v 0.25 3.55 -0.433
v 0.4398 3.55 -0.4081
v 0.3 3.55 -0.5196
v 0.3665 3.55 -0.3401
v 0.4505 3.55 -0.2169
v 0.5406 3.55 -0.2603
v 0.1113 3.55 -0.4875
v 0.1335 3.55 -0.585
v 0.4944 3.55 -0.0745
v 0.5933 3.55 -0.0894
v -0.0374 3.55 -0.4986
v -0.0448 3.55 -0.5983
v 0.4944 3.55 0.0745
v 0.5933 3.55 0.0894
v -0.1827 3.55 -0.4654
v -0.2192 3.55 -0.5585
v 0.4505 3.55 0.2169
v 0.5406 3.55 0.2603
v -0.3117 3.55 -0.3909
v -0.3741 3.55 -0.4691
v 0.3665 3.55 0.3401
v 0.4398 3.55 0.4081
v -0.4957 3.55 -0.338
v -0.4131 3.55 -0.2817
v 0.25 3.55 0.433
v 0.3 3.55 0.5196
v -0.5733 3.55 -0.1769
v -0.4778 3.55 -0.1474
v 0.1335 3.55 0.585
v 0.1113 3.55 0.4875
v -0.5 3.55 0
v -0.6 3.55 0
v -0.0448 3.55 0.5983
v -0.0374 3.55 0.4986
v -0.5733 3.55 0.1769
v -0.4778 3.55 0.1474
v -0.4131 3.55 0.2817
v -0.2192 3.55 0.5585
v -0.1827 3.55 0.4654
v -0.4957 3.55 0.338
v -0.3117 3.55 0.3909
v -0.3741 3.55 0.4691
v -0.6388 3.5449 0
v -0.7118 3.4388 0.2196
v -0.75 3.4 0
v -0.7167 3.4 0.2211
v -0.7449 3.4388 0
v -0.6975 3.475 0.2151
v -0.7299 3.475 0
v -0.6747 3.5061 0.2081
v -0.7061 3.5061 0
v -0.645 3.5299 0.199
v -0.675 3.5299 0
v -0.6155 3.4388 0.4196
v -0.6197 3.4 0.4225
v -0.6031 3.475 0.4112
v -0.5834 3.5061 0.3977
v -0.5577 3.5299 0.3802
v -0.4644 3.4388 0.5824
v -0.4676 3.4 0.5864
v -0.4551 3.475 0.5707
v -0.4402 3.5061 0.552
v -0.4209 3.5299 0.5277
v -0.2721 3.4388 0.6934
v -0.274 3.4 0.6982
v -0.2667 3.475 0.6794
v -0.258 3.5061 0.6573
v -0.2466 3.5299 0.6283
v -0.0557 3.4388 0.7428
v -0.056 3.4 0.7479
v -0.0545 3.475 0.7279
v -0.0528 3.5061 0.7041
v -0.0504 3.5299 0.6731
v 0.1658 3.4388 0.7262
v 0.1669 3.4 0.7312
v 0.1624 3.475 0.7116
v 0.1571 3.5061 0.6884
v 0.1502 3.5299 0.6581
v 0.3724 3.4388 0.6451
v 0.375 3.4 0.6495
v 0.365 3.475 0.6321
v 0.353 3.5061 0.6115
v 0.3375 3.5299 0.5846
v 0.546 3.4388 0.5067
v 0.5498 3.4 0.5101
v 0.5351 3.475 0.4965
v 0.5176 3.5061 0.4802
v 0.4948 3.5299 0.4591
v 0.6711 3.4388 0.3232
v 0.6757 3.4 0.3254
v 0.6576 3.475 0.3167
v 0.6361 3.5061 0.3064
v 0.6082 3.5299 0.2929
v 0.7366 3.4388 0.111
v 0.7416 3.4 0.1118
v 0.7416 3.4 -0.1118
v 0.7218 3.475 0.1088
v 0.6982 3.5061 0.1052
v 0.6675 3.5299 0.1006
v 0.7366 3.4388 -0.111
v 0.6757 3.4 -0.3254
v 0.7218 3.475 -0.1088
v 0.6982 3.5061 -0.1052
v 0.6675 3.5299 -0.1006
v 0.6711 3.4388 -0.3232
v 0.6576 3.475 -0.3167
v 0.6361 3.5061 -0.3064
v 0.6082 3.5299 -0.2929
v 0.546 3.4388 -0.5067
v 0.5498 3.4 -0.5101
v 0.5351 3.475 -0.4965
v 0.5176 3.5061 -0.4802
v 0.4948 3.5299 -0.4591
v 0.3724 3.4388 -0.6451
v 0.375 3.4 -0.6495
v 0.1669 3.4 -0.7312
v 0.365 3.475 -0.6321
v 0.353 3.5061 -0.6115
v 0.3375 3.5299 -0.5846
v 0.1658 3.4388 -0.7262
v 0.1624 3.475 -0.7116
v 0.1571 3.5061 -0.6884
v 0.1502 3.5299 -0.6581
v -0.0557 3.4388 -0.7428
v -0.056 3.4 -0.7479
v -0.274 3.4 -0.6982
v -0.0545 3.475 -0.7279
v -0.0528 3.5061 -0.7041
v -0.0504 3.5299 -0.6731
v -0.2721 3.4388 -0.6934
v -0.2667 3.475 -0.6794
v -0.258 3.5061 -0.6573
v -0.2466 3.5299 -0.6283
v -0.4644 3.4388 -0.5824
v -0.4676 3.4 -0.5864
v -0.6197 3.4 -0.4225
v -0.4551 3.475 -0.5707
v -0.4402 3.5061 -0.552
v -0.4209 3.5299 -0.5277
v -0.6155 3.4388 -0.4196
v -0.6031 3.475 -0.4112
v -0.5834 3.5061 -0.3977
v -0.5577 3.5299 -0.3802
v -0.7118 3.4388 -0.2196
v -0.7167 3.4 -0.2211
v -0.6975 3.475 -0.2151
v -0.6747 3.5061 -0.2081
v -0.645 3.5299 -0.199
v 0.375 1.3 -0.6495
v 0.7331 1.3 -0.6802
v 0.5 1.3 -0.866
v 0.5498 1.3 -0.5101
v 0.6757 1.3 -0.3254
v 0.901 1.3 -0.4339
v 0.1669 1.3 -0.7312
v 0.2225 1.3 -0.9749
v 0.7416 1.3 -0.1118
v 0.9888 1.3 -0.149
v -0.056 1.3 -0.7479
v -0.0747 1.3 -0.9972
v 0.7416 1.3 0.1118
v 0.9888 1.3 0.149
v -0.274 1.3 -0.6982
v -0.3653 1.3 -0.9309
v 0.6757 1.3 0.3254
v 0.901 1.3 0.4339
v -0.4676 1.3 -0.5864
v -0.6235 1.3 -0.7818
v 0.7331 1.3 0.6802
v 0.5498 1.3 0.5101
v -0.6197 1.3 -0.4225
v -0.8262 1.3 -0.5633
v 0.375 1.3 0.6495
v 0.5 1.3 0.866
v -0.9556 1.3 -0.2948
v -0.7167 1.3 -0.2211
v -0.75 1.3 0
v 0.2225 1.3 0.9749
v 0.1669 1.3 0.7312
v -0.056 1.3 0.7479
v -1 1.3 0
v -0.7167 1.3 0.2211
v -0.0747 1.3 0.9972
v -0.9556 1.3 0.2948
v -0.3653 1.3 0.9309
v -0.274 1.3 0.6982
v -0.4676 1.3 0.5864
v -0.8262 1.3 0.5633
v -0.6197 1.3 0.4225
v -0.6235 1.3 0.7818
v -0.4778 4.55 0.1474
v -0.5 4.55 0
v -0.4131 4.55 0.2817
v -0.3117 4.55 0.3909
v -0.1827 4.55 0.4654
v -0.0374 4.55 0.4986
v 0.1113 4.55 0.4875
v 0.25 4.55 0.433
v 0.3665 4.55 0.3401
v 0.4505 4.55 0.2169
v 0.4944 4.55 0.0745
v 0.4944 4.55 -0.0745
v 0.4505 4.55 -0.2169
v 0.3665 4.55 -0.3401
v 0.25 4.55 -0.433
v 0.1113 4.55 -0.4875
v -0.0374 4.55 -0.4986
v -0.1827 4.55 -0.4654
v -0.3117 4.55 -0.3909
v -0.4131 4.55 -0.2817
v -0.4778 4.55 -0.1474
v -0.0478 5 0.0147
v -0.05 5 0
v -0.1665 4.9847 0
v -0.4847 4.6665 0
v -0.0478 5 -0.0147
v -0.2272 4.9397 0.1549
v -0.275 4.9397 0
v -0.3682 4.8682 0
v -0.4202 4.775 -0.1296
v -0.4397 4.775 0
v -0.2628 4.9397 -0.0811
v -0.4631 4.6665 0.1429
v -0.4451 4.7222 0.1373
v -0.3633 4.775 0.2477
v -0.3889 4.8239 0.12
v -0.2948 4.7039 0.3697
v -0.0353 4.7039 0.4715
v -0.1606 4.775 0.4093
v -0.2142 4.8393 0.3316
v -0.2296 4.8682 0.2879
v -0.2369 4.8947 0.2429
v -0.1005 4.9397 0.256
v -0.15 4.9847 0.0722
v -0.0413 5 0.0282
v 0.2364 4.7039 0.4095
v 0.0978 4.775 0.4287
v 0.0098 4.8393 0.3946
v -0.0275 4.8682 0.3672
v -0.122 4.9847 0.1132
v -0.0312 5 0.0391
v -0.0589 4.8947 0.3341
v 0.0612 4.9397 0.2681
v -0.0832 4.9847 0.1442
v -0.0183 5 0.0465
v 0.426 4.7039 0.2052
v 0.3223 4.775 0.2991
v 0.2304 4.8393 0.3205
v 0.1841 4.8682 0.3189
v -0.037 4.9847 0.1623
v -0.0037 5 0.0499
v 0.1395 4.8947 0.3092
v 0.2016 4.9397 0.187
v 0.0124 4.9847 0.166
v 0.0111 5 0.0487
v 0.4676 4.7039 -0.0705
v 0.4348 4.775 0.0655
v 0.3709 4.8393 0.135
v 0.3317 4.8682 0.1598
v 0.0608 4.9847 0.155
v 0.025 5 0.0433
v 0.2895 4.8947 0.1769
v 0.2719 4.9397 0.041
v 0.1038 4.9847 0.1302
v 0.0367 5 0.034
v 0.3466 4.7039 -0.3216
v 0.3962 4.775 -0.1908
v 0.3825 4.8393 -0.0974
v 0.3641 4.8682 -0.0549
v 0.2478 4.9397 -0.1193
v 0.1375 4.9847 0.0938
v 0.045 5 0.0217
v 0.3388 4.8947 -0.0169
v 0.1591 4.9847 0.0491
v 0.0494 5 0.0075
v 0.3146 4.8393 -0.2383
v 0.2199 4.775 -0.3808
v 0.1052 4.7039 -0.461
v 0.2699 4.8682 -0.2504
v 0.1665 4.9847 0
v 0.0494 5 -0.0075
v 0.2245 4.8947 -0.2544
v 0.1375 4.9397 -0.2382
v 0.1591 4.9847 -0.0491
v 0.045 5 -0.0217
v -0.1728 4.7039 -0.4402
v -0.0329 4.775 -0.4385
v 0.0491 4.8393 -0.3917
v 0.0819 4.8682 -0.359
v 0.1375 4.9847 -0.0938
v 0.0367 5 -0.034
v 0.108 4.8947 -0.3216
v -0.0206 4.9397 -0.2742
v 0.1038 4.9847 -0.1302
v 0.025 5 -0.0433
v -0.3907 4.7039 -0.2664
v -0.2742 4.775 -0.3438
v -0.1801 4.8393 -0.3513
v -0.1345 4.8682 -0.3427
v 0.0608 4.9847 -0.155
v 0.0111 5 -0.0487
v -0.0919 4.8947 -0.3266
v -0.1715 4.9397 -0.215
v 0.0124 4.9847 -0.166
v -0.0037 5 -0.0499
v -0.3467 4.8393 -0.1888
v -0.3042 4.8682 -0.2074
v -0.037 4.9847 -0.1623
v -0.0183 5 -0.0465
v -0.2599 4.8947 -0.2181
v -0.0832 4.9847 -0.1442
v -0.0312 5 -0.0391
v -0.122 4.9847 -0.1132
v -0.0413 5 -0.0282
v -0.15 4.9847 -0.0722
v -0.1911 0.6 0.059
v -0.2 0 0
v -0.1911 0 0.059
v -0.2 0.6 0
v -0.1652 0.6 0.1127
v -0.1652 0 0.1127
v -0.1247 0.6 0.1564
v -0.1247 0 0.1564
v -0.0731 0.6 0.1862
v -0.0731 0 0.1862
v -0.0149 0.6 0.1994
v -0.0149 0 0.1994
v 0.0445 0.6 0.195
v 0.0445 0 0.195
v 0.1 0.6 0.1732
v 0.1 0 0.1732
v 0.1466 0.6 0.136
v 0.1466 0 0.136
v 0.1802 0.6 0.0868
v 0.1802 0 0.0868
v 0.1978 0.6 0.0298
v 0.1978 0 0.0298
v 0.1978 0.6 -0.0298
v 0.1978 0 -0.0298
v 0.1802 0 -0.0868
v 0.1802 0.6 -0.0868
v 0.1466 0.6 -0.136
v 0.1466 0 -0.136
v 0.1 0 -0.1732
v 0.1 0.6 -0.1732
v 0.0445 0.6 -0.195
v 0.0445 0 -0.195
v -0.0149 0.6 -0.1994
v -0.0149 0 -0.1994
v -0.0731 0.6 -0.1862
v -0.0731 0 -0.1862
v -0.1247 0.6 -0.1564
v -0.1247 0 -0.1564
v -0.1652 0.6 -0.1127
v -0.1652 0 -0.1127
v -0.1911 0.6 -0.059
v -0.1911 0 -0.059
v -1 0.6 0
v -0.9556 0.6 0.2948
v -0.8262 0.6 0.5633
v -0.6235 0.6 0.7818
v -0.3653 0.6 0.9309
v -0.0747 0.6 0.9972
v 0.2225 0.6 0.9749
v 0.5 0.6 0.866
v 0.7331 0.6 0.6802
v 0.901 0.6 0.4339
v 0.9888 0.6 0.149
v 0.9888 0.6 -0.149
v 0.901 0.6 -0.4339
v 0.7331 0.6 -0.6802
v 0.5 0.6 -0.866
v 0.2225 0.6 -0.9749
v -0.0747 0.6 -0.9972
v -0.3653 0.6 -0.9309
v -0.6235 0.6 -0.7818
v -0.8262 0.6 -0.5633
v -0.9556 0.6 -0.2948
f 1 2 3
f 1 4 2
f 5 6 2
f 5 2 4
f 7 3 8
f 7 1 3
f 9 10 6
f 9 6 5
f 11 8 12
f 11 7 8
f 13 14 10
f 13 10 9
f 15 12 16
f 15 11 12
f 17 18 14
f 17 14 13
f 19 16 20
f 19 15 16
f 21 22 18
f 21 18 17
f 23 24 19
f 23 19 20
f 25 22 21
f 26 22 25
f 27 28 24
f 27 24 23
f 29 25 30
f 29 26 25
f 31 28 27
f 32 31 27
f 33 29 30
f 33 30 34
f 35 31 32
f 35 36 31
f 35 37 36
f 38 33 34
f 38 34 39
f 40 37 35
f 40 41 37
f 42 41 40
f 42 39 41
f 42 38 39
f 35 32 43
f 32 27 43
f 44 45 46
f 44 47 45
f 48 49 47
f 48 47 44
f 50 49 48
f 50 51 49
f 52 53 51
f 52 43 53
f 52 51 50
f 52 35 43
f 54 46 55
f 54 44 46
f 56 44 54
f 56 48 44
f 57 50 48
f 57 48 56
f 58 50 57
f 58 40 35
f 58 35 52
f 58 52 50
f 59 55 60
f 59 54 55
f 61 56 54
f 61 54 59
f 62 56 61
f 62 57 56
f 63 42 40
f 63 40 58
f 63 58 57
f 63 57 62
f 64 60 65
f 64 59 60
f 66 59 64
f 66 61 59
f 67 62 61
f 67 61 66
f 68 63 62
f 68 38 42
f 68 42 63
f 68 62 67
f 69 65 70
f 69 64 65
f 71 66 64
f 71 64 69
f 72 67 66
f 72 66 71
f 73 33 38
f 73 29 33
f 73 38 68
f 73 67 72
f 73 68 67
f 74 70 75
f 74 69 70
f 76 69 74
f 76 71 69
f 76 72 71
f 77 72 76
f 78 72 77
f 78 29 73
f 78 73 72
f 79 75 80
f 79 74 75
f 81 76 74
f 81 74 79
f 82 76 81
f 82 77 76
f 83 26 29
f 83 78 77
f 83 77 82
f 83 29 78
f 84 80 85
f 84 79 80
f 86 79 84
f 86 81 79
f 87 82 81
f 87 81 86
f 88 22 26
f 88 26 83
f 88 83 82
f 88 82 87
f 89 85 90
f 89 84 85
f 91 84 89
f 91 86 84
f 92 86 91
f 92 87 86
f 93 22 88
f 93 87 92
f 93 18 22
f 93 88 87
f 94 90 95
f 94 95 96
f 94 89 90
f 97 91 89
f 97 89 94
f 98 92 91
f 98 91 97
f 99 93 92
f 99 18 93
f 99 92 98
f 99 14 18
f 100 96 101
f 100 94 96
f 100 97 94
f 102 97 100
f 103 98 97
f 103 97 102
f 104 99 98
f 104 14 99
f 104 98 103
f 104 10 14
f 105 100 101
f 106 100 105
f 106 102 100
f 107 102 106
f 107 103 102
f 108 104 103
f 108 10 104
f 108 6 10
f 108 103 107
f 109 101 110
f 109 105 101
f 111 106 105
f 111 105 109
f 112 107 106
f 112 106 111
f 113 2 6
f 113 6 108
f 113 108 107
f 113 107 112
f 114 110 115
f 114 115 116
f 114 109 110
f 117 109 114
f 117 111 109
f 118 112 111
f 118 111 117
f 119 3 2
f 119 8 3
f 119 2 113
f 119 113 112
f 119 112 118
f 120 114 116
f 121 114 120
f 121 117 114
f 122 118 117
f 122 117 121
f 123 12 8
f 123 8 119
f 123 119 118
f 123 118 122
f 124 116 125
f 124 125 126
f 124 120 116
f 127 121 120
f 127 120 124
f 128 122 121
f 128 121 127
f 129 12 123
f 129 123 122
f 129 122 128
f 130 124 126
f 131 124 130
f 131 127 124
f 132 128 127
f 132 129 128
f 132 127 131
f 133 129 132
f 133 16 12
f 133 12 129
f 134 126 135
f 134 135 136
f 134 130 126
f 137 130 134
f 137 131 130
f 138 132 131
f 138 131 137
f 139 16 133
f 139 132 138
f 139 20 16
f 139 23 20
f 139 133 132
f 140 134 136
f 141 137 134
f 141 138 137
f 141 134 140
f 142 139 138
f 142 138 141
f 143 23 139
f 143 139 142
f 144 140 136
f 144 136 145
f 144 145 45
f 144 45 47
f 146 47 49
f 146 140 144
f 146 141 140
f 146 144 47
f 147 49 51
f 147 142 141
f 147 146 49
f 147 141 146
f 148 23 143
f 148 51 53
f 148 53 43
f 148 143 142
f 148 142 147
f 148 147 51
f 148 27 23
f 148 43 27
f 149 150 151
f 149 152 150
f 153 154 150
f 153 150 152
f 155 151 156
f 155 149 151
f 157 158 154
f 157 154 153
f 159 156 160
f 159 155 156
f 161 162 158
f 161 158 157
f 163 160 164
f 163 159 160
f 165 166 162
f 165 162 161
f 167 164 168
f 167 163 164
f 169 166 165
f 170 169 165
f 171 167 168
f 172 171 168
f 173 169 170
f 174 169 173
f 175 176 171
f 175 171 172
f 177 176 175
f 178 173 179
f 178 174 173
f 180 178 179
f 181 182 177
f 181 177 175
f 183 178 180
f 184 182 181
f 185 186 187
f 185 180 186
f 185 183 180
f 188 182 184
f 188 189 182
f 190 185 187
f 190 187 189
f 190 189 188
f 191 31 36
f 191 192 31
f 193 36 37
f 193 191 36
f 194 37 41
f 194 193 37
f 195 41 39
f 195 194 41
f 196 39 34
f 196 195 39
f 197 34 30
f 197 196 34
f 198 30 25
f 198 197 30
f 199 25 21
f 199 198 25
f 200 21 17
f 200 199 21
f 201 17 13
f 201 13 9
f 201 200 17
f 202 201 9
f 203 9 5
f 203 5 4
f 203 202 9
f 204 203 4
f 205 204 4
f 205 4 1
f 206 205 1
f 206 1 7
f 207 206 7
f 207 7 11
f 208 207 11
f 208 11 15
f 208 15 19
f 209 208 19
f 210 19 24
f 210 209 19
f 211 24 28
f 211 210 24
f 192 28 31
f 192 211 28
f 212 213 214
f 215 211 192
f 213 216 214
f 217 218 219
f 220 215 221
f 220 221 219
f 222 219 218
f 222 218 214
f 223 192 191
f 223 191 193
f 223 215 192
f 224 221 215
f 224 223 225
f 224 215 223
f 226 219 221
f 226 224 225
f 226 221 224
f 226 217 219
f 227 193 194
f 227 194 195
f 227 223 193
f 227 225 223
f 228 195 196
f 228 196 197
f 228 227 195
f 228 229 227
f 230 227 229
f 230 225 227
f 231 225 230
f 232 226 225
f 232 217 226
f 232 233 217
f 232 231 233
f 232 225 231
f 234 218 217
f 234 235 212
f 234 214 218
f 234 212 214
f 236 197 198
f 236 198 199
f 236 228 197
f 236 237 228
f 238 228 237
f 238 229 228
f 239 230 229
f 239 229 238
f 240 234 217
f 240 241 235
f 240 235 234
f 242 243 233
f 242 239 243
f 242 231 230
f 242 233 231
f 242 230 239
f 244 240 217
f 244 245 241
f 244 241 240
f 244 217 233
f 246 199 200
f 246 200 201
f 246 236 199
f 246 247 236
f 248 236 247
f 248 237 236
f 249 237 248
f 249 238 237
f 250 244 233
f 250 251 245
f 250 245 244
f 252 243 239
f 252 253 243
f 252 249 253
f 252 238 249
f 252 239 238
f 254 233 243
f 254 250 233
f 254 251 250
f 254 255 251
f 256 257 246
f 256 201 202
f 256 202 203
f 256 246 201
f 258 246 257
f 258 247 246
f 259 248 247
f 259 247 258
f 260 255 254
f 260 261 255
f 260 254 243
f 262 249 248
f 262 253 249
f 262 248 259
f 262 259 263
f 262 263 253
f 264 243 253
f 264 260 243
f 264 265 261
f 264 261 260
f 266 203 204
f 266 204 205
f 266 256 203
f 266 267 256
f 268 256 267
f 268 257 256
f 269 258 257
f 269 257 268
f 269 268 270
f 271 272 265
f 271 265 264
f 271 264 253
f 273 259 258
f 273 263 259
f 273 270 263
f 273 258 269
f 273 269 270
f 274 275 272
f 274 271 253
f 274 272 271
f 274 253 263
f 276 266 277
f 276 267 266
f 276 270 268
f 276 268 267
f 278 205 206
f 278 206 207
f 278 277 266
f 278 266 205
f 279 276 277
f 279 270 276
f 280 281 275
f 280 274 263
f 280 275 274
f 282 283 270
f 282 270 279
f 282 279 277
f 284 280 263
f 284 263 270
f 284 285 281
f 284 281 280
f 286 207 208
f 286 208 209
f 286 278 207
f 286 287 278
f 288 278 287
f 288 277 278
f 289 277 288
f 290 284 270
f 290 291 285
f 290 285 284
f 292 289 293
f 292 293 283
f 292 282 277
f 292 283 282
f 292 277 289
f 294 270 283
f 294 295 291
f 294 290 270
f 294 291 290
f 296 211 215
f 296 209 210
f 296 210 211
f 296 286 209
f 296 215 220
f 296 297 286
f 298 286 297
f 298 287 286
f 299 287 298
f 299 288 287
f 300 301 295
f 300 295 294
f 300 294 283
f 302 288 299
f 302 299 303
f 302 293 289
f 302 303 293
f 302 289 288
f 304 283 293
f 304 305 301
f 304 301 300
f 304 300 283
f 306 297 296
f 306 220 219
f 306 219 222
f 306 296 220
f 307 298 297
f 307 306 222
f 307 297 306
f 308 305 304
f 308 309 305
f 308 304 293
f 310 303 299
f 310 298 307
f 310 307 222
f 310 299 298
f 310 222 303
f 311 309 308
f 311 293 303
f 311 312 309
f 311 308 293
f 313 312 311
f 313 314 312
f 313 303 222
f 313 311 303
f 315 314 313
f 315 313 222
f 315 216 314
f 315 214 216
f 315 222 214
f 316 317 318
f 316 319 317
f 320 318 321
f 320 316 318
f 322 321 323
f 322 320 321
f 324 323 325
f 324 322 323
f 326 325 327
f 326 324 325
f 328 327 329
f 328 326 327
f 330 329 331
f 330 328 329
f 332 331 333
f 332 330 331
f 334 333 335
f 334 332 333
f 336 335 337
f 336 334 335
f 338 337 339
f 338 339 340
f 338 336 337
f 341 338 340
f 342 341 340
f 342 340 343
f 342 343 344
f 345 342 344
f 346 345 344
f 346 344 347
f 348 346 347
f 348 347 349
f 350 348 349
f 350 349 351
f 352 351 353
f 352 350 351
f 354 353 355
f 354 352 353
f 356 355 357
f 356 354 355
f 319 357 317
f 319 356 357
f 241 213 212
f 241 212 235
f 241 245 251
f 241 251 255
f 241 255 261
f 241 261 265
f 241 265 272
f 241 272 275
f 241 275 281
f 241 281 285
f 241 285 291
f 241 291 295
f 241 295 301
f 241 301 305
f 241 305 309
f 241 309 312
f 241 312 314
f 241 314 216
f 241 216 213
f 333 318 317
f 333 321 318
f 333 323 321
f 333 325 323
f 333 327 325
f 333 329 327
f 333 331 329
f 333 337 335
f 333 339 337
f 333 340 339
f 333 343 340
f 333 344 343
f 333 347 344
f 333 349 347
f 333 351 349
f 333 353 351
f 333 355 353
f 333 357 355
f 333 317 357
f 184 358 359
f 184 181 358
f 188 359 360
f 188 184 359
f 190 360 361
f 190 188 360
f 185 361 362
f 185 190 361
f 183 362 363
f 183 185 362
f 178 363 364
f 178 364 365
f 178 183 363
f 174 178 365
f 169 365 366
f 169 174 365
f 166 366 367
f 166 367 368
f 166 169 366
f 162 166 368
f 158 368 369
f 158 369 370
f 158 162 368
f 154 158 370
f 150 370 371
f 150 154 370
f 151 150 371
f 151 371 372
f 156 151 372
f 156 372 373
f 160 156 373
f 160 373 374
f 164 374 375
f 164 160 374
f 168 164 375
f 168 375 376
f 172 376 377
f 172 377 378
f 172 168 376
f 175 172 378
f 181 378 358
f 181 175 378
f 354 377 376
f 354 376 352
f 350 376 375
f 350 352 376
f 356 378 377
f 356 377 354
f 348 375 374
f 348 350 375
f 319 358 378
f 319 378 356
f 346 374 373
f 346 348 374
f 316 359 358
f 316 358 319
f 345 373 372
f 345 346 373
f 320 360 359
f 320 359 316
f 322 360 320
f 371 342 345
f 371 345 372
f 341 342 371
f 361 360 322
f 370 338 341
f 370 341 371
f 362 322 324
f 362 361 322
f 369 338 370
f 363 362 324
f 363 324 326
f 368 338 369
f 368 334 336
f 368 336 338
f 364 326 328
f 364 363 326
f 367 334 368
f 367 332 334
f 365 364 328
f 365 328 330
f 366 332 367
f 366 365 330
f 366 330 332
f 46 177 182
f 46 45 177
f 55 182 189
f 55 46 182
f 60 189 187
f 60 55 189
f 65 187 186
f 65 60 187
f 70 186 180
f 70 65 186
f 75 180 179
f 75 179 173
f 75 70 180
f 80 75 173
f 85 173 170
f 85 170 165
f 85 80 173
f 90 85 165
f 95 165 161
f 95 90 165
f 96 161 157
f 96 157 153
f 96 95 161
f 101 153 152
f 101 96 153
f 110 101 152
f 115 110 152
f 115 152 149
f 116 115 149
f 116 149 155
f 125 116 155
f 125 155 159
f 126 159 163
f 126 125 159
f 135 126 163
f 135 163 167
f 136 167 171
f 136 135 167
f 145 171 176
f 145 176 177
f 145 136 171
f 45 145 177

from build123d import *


with BuildPart() as part:
    # Sketch1 → Revolve1 (revolve)
    with BuildSketch(Plane.XY):
        with BuildLine():
            Line((0, 0), (-0.2, 0))
            Line((-0.2, 0), (-0.2, 0.6))
            Line((-0.2, 0.6), (-1, 0.6))
            Line((-1, 0.6), (-1, 1.3))
            Line((-1, 1.3), (-0.75, 1.3))
            Line((-0.75, 1.3), (-0.75, 3.4))
            ThreePointArc((-0.75, 3.4), (-0.706066017, 3.506066017), (-0.6, 3.55))
            Line((-0.6, 3.55), (-0.5, 3.55))
            Line((-0.5, 3.55), (-0.5, 4.55))
            ThreePointArc((-0.5, 4.55), (-0.368198052, 4.868198052), (-0.05, 5))
            Line((-0.05, 5), (0, 5))
            Line((0, 5), (0, 0))
        make_face()
    revolve(axis=Axis((0, 0, 0), (0, 1, 0)))


solid = part.part
